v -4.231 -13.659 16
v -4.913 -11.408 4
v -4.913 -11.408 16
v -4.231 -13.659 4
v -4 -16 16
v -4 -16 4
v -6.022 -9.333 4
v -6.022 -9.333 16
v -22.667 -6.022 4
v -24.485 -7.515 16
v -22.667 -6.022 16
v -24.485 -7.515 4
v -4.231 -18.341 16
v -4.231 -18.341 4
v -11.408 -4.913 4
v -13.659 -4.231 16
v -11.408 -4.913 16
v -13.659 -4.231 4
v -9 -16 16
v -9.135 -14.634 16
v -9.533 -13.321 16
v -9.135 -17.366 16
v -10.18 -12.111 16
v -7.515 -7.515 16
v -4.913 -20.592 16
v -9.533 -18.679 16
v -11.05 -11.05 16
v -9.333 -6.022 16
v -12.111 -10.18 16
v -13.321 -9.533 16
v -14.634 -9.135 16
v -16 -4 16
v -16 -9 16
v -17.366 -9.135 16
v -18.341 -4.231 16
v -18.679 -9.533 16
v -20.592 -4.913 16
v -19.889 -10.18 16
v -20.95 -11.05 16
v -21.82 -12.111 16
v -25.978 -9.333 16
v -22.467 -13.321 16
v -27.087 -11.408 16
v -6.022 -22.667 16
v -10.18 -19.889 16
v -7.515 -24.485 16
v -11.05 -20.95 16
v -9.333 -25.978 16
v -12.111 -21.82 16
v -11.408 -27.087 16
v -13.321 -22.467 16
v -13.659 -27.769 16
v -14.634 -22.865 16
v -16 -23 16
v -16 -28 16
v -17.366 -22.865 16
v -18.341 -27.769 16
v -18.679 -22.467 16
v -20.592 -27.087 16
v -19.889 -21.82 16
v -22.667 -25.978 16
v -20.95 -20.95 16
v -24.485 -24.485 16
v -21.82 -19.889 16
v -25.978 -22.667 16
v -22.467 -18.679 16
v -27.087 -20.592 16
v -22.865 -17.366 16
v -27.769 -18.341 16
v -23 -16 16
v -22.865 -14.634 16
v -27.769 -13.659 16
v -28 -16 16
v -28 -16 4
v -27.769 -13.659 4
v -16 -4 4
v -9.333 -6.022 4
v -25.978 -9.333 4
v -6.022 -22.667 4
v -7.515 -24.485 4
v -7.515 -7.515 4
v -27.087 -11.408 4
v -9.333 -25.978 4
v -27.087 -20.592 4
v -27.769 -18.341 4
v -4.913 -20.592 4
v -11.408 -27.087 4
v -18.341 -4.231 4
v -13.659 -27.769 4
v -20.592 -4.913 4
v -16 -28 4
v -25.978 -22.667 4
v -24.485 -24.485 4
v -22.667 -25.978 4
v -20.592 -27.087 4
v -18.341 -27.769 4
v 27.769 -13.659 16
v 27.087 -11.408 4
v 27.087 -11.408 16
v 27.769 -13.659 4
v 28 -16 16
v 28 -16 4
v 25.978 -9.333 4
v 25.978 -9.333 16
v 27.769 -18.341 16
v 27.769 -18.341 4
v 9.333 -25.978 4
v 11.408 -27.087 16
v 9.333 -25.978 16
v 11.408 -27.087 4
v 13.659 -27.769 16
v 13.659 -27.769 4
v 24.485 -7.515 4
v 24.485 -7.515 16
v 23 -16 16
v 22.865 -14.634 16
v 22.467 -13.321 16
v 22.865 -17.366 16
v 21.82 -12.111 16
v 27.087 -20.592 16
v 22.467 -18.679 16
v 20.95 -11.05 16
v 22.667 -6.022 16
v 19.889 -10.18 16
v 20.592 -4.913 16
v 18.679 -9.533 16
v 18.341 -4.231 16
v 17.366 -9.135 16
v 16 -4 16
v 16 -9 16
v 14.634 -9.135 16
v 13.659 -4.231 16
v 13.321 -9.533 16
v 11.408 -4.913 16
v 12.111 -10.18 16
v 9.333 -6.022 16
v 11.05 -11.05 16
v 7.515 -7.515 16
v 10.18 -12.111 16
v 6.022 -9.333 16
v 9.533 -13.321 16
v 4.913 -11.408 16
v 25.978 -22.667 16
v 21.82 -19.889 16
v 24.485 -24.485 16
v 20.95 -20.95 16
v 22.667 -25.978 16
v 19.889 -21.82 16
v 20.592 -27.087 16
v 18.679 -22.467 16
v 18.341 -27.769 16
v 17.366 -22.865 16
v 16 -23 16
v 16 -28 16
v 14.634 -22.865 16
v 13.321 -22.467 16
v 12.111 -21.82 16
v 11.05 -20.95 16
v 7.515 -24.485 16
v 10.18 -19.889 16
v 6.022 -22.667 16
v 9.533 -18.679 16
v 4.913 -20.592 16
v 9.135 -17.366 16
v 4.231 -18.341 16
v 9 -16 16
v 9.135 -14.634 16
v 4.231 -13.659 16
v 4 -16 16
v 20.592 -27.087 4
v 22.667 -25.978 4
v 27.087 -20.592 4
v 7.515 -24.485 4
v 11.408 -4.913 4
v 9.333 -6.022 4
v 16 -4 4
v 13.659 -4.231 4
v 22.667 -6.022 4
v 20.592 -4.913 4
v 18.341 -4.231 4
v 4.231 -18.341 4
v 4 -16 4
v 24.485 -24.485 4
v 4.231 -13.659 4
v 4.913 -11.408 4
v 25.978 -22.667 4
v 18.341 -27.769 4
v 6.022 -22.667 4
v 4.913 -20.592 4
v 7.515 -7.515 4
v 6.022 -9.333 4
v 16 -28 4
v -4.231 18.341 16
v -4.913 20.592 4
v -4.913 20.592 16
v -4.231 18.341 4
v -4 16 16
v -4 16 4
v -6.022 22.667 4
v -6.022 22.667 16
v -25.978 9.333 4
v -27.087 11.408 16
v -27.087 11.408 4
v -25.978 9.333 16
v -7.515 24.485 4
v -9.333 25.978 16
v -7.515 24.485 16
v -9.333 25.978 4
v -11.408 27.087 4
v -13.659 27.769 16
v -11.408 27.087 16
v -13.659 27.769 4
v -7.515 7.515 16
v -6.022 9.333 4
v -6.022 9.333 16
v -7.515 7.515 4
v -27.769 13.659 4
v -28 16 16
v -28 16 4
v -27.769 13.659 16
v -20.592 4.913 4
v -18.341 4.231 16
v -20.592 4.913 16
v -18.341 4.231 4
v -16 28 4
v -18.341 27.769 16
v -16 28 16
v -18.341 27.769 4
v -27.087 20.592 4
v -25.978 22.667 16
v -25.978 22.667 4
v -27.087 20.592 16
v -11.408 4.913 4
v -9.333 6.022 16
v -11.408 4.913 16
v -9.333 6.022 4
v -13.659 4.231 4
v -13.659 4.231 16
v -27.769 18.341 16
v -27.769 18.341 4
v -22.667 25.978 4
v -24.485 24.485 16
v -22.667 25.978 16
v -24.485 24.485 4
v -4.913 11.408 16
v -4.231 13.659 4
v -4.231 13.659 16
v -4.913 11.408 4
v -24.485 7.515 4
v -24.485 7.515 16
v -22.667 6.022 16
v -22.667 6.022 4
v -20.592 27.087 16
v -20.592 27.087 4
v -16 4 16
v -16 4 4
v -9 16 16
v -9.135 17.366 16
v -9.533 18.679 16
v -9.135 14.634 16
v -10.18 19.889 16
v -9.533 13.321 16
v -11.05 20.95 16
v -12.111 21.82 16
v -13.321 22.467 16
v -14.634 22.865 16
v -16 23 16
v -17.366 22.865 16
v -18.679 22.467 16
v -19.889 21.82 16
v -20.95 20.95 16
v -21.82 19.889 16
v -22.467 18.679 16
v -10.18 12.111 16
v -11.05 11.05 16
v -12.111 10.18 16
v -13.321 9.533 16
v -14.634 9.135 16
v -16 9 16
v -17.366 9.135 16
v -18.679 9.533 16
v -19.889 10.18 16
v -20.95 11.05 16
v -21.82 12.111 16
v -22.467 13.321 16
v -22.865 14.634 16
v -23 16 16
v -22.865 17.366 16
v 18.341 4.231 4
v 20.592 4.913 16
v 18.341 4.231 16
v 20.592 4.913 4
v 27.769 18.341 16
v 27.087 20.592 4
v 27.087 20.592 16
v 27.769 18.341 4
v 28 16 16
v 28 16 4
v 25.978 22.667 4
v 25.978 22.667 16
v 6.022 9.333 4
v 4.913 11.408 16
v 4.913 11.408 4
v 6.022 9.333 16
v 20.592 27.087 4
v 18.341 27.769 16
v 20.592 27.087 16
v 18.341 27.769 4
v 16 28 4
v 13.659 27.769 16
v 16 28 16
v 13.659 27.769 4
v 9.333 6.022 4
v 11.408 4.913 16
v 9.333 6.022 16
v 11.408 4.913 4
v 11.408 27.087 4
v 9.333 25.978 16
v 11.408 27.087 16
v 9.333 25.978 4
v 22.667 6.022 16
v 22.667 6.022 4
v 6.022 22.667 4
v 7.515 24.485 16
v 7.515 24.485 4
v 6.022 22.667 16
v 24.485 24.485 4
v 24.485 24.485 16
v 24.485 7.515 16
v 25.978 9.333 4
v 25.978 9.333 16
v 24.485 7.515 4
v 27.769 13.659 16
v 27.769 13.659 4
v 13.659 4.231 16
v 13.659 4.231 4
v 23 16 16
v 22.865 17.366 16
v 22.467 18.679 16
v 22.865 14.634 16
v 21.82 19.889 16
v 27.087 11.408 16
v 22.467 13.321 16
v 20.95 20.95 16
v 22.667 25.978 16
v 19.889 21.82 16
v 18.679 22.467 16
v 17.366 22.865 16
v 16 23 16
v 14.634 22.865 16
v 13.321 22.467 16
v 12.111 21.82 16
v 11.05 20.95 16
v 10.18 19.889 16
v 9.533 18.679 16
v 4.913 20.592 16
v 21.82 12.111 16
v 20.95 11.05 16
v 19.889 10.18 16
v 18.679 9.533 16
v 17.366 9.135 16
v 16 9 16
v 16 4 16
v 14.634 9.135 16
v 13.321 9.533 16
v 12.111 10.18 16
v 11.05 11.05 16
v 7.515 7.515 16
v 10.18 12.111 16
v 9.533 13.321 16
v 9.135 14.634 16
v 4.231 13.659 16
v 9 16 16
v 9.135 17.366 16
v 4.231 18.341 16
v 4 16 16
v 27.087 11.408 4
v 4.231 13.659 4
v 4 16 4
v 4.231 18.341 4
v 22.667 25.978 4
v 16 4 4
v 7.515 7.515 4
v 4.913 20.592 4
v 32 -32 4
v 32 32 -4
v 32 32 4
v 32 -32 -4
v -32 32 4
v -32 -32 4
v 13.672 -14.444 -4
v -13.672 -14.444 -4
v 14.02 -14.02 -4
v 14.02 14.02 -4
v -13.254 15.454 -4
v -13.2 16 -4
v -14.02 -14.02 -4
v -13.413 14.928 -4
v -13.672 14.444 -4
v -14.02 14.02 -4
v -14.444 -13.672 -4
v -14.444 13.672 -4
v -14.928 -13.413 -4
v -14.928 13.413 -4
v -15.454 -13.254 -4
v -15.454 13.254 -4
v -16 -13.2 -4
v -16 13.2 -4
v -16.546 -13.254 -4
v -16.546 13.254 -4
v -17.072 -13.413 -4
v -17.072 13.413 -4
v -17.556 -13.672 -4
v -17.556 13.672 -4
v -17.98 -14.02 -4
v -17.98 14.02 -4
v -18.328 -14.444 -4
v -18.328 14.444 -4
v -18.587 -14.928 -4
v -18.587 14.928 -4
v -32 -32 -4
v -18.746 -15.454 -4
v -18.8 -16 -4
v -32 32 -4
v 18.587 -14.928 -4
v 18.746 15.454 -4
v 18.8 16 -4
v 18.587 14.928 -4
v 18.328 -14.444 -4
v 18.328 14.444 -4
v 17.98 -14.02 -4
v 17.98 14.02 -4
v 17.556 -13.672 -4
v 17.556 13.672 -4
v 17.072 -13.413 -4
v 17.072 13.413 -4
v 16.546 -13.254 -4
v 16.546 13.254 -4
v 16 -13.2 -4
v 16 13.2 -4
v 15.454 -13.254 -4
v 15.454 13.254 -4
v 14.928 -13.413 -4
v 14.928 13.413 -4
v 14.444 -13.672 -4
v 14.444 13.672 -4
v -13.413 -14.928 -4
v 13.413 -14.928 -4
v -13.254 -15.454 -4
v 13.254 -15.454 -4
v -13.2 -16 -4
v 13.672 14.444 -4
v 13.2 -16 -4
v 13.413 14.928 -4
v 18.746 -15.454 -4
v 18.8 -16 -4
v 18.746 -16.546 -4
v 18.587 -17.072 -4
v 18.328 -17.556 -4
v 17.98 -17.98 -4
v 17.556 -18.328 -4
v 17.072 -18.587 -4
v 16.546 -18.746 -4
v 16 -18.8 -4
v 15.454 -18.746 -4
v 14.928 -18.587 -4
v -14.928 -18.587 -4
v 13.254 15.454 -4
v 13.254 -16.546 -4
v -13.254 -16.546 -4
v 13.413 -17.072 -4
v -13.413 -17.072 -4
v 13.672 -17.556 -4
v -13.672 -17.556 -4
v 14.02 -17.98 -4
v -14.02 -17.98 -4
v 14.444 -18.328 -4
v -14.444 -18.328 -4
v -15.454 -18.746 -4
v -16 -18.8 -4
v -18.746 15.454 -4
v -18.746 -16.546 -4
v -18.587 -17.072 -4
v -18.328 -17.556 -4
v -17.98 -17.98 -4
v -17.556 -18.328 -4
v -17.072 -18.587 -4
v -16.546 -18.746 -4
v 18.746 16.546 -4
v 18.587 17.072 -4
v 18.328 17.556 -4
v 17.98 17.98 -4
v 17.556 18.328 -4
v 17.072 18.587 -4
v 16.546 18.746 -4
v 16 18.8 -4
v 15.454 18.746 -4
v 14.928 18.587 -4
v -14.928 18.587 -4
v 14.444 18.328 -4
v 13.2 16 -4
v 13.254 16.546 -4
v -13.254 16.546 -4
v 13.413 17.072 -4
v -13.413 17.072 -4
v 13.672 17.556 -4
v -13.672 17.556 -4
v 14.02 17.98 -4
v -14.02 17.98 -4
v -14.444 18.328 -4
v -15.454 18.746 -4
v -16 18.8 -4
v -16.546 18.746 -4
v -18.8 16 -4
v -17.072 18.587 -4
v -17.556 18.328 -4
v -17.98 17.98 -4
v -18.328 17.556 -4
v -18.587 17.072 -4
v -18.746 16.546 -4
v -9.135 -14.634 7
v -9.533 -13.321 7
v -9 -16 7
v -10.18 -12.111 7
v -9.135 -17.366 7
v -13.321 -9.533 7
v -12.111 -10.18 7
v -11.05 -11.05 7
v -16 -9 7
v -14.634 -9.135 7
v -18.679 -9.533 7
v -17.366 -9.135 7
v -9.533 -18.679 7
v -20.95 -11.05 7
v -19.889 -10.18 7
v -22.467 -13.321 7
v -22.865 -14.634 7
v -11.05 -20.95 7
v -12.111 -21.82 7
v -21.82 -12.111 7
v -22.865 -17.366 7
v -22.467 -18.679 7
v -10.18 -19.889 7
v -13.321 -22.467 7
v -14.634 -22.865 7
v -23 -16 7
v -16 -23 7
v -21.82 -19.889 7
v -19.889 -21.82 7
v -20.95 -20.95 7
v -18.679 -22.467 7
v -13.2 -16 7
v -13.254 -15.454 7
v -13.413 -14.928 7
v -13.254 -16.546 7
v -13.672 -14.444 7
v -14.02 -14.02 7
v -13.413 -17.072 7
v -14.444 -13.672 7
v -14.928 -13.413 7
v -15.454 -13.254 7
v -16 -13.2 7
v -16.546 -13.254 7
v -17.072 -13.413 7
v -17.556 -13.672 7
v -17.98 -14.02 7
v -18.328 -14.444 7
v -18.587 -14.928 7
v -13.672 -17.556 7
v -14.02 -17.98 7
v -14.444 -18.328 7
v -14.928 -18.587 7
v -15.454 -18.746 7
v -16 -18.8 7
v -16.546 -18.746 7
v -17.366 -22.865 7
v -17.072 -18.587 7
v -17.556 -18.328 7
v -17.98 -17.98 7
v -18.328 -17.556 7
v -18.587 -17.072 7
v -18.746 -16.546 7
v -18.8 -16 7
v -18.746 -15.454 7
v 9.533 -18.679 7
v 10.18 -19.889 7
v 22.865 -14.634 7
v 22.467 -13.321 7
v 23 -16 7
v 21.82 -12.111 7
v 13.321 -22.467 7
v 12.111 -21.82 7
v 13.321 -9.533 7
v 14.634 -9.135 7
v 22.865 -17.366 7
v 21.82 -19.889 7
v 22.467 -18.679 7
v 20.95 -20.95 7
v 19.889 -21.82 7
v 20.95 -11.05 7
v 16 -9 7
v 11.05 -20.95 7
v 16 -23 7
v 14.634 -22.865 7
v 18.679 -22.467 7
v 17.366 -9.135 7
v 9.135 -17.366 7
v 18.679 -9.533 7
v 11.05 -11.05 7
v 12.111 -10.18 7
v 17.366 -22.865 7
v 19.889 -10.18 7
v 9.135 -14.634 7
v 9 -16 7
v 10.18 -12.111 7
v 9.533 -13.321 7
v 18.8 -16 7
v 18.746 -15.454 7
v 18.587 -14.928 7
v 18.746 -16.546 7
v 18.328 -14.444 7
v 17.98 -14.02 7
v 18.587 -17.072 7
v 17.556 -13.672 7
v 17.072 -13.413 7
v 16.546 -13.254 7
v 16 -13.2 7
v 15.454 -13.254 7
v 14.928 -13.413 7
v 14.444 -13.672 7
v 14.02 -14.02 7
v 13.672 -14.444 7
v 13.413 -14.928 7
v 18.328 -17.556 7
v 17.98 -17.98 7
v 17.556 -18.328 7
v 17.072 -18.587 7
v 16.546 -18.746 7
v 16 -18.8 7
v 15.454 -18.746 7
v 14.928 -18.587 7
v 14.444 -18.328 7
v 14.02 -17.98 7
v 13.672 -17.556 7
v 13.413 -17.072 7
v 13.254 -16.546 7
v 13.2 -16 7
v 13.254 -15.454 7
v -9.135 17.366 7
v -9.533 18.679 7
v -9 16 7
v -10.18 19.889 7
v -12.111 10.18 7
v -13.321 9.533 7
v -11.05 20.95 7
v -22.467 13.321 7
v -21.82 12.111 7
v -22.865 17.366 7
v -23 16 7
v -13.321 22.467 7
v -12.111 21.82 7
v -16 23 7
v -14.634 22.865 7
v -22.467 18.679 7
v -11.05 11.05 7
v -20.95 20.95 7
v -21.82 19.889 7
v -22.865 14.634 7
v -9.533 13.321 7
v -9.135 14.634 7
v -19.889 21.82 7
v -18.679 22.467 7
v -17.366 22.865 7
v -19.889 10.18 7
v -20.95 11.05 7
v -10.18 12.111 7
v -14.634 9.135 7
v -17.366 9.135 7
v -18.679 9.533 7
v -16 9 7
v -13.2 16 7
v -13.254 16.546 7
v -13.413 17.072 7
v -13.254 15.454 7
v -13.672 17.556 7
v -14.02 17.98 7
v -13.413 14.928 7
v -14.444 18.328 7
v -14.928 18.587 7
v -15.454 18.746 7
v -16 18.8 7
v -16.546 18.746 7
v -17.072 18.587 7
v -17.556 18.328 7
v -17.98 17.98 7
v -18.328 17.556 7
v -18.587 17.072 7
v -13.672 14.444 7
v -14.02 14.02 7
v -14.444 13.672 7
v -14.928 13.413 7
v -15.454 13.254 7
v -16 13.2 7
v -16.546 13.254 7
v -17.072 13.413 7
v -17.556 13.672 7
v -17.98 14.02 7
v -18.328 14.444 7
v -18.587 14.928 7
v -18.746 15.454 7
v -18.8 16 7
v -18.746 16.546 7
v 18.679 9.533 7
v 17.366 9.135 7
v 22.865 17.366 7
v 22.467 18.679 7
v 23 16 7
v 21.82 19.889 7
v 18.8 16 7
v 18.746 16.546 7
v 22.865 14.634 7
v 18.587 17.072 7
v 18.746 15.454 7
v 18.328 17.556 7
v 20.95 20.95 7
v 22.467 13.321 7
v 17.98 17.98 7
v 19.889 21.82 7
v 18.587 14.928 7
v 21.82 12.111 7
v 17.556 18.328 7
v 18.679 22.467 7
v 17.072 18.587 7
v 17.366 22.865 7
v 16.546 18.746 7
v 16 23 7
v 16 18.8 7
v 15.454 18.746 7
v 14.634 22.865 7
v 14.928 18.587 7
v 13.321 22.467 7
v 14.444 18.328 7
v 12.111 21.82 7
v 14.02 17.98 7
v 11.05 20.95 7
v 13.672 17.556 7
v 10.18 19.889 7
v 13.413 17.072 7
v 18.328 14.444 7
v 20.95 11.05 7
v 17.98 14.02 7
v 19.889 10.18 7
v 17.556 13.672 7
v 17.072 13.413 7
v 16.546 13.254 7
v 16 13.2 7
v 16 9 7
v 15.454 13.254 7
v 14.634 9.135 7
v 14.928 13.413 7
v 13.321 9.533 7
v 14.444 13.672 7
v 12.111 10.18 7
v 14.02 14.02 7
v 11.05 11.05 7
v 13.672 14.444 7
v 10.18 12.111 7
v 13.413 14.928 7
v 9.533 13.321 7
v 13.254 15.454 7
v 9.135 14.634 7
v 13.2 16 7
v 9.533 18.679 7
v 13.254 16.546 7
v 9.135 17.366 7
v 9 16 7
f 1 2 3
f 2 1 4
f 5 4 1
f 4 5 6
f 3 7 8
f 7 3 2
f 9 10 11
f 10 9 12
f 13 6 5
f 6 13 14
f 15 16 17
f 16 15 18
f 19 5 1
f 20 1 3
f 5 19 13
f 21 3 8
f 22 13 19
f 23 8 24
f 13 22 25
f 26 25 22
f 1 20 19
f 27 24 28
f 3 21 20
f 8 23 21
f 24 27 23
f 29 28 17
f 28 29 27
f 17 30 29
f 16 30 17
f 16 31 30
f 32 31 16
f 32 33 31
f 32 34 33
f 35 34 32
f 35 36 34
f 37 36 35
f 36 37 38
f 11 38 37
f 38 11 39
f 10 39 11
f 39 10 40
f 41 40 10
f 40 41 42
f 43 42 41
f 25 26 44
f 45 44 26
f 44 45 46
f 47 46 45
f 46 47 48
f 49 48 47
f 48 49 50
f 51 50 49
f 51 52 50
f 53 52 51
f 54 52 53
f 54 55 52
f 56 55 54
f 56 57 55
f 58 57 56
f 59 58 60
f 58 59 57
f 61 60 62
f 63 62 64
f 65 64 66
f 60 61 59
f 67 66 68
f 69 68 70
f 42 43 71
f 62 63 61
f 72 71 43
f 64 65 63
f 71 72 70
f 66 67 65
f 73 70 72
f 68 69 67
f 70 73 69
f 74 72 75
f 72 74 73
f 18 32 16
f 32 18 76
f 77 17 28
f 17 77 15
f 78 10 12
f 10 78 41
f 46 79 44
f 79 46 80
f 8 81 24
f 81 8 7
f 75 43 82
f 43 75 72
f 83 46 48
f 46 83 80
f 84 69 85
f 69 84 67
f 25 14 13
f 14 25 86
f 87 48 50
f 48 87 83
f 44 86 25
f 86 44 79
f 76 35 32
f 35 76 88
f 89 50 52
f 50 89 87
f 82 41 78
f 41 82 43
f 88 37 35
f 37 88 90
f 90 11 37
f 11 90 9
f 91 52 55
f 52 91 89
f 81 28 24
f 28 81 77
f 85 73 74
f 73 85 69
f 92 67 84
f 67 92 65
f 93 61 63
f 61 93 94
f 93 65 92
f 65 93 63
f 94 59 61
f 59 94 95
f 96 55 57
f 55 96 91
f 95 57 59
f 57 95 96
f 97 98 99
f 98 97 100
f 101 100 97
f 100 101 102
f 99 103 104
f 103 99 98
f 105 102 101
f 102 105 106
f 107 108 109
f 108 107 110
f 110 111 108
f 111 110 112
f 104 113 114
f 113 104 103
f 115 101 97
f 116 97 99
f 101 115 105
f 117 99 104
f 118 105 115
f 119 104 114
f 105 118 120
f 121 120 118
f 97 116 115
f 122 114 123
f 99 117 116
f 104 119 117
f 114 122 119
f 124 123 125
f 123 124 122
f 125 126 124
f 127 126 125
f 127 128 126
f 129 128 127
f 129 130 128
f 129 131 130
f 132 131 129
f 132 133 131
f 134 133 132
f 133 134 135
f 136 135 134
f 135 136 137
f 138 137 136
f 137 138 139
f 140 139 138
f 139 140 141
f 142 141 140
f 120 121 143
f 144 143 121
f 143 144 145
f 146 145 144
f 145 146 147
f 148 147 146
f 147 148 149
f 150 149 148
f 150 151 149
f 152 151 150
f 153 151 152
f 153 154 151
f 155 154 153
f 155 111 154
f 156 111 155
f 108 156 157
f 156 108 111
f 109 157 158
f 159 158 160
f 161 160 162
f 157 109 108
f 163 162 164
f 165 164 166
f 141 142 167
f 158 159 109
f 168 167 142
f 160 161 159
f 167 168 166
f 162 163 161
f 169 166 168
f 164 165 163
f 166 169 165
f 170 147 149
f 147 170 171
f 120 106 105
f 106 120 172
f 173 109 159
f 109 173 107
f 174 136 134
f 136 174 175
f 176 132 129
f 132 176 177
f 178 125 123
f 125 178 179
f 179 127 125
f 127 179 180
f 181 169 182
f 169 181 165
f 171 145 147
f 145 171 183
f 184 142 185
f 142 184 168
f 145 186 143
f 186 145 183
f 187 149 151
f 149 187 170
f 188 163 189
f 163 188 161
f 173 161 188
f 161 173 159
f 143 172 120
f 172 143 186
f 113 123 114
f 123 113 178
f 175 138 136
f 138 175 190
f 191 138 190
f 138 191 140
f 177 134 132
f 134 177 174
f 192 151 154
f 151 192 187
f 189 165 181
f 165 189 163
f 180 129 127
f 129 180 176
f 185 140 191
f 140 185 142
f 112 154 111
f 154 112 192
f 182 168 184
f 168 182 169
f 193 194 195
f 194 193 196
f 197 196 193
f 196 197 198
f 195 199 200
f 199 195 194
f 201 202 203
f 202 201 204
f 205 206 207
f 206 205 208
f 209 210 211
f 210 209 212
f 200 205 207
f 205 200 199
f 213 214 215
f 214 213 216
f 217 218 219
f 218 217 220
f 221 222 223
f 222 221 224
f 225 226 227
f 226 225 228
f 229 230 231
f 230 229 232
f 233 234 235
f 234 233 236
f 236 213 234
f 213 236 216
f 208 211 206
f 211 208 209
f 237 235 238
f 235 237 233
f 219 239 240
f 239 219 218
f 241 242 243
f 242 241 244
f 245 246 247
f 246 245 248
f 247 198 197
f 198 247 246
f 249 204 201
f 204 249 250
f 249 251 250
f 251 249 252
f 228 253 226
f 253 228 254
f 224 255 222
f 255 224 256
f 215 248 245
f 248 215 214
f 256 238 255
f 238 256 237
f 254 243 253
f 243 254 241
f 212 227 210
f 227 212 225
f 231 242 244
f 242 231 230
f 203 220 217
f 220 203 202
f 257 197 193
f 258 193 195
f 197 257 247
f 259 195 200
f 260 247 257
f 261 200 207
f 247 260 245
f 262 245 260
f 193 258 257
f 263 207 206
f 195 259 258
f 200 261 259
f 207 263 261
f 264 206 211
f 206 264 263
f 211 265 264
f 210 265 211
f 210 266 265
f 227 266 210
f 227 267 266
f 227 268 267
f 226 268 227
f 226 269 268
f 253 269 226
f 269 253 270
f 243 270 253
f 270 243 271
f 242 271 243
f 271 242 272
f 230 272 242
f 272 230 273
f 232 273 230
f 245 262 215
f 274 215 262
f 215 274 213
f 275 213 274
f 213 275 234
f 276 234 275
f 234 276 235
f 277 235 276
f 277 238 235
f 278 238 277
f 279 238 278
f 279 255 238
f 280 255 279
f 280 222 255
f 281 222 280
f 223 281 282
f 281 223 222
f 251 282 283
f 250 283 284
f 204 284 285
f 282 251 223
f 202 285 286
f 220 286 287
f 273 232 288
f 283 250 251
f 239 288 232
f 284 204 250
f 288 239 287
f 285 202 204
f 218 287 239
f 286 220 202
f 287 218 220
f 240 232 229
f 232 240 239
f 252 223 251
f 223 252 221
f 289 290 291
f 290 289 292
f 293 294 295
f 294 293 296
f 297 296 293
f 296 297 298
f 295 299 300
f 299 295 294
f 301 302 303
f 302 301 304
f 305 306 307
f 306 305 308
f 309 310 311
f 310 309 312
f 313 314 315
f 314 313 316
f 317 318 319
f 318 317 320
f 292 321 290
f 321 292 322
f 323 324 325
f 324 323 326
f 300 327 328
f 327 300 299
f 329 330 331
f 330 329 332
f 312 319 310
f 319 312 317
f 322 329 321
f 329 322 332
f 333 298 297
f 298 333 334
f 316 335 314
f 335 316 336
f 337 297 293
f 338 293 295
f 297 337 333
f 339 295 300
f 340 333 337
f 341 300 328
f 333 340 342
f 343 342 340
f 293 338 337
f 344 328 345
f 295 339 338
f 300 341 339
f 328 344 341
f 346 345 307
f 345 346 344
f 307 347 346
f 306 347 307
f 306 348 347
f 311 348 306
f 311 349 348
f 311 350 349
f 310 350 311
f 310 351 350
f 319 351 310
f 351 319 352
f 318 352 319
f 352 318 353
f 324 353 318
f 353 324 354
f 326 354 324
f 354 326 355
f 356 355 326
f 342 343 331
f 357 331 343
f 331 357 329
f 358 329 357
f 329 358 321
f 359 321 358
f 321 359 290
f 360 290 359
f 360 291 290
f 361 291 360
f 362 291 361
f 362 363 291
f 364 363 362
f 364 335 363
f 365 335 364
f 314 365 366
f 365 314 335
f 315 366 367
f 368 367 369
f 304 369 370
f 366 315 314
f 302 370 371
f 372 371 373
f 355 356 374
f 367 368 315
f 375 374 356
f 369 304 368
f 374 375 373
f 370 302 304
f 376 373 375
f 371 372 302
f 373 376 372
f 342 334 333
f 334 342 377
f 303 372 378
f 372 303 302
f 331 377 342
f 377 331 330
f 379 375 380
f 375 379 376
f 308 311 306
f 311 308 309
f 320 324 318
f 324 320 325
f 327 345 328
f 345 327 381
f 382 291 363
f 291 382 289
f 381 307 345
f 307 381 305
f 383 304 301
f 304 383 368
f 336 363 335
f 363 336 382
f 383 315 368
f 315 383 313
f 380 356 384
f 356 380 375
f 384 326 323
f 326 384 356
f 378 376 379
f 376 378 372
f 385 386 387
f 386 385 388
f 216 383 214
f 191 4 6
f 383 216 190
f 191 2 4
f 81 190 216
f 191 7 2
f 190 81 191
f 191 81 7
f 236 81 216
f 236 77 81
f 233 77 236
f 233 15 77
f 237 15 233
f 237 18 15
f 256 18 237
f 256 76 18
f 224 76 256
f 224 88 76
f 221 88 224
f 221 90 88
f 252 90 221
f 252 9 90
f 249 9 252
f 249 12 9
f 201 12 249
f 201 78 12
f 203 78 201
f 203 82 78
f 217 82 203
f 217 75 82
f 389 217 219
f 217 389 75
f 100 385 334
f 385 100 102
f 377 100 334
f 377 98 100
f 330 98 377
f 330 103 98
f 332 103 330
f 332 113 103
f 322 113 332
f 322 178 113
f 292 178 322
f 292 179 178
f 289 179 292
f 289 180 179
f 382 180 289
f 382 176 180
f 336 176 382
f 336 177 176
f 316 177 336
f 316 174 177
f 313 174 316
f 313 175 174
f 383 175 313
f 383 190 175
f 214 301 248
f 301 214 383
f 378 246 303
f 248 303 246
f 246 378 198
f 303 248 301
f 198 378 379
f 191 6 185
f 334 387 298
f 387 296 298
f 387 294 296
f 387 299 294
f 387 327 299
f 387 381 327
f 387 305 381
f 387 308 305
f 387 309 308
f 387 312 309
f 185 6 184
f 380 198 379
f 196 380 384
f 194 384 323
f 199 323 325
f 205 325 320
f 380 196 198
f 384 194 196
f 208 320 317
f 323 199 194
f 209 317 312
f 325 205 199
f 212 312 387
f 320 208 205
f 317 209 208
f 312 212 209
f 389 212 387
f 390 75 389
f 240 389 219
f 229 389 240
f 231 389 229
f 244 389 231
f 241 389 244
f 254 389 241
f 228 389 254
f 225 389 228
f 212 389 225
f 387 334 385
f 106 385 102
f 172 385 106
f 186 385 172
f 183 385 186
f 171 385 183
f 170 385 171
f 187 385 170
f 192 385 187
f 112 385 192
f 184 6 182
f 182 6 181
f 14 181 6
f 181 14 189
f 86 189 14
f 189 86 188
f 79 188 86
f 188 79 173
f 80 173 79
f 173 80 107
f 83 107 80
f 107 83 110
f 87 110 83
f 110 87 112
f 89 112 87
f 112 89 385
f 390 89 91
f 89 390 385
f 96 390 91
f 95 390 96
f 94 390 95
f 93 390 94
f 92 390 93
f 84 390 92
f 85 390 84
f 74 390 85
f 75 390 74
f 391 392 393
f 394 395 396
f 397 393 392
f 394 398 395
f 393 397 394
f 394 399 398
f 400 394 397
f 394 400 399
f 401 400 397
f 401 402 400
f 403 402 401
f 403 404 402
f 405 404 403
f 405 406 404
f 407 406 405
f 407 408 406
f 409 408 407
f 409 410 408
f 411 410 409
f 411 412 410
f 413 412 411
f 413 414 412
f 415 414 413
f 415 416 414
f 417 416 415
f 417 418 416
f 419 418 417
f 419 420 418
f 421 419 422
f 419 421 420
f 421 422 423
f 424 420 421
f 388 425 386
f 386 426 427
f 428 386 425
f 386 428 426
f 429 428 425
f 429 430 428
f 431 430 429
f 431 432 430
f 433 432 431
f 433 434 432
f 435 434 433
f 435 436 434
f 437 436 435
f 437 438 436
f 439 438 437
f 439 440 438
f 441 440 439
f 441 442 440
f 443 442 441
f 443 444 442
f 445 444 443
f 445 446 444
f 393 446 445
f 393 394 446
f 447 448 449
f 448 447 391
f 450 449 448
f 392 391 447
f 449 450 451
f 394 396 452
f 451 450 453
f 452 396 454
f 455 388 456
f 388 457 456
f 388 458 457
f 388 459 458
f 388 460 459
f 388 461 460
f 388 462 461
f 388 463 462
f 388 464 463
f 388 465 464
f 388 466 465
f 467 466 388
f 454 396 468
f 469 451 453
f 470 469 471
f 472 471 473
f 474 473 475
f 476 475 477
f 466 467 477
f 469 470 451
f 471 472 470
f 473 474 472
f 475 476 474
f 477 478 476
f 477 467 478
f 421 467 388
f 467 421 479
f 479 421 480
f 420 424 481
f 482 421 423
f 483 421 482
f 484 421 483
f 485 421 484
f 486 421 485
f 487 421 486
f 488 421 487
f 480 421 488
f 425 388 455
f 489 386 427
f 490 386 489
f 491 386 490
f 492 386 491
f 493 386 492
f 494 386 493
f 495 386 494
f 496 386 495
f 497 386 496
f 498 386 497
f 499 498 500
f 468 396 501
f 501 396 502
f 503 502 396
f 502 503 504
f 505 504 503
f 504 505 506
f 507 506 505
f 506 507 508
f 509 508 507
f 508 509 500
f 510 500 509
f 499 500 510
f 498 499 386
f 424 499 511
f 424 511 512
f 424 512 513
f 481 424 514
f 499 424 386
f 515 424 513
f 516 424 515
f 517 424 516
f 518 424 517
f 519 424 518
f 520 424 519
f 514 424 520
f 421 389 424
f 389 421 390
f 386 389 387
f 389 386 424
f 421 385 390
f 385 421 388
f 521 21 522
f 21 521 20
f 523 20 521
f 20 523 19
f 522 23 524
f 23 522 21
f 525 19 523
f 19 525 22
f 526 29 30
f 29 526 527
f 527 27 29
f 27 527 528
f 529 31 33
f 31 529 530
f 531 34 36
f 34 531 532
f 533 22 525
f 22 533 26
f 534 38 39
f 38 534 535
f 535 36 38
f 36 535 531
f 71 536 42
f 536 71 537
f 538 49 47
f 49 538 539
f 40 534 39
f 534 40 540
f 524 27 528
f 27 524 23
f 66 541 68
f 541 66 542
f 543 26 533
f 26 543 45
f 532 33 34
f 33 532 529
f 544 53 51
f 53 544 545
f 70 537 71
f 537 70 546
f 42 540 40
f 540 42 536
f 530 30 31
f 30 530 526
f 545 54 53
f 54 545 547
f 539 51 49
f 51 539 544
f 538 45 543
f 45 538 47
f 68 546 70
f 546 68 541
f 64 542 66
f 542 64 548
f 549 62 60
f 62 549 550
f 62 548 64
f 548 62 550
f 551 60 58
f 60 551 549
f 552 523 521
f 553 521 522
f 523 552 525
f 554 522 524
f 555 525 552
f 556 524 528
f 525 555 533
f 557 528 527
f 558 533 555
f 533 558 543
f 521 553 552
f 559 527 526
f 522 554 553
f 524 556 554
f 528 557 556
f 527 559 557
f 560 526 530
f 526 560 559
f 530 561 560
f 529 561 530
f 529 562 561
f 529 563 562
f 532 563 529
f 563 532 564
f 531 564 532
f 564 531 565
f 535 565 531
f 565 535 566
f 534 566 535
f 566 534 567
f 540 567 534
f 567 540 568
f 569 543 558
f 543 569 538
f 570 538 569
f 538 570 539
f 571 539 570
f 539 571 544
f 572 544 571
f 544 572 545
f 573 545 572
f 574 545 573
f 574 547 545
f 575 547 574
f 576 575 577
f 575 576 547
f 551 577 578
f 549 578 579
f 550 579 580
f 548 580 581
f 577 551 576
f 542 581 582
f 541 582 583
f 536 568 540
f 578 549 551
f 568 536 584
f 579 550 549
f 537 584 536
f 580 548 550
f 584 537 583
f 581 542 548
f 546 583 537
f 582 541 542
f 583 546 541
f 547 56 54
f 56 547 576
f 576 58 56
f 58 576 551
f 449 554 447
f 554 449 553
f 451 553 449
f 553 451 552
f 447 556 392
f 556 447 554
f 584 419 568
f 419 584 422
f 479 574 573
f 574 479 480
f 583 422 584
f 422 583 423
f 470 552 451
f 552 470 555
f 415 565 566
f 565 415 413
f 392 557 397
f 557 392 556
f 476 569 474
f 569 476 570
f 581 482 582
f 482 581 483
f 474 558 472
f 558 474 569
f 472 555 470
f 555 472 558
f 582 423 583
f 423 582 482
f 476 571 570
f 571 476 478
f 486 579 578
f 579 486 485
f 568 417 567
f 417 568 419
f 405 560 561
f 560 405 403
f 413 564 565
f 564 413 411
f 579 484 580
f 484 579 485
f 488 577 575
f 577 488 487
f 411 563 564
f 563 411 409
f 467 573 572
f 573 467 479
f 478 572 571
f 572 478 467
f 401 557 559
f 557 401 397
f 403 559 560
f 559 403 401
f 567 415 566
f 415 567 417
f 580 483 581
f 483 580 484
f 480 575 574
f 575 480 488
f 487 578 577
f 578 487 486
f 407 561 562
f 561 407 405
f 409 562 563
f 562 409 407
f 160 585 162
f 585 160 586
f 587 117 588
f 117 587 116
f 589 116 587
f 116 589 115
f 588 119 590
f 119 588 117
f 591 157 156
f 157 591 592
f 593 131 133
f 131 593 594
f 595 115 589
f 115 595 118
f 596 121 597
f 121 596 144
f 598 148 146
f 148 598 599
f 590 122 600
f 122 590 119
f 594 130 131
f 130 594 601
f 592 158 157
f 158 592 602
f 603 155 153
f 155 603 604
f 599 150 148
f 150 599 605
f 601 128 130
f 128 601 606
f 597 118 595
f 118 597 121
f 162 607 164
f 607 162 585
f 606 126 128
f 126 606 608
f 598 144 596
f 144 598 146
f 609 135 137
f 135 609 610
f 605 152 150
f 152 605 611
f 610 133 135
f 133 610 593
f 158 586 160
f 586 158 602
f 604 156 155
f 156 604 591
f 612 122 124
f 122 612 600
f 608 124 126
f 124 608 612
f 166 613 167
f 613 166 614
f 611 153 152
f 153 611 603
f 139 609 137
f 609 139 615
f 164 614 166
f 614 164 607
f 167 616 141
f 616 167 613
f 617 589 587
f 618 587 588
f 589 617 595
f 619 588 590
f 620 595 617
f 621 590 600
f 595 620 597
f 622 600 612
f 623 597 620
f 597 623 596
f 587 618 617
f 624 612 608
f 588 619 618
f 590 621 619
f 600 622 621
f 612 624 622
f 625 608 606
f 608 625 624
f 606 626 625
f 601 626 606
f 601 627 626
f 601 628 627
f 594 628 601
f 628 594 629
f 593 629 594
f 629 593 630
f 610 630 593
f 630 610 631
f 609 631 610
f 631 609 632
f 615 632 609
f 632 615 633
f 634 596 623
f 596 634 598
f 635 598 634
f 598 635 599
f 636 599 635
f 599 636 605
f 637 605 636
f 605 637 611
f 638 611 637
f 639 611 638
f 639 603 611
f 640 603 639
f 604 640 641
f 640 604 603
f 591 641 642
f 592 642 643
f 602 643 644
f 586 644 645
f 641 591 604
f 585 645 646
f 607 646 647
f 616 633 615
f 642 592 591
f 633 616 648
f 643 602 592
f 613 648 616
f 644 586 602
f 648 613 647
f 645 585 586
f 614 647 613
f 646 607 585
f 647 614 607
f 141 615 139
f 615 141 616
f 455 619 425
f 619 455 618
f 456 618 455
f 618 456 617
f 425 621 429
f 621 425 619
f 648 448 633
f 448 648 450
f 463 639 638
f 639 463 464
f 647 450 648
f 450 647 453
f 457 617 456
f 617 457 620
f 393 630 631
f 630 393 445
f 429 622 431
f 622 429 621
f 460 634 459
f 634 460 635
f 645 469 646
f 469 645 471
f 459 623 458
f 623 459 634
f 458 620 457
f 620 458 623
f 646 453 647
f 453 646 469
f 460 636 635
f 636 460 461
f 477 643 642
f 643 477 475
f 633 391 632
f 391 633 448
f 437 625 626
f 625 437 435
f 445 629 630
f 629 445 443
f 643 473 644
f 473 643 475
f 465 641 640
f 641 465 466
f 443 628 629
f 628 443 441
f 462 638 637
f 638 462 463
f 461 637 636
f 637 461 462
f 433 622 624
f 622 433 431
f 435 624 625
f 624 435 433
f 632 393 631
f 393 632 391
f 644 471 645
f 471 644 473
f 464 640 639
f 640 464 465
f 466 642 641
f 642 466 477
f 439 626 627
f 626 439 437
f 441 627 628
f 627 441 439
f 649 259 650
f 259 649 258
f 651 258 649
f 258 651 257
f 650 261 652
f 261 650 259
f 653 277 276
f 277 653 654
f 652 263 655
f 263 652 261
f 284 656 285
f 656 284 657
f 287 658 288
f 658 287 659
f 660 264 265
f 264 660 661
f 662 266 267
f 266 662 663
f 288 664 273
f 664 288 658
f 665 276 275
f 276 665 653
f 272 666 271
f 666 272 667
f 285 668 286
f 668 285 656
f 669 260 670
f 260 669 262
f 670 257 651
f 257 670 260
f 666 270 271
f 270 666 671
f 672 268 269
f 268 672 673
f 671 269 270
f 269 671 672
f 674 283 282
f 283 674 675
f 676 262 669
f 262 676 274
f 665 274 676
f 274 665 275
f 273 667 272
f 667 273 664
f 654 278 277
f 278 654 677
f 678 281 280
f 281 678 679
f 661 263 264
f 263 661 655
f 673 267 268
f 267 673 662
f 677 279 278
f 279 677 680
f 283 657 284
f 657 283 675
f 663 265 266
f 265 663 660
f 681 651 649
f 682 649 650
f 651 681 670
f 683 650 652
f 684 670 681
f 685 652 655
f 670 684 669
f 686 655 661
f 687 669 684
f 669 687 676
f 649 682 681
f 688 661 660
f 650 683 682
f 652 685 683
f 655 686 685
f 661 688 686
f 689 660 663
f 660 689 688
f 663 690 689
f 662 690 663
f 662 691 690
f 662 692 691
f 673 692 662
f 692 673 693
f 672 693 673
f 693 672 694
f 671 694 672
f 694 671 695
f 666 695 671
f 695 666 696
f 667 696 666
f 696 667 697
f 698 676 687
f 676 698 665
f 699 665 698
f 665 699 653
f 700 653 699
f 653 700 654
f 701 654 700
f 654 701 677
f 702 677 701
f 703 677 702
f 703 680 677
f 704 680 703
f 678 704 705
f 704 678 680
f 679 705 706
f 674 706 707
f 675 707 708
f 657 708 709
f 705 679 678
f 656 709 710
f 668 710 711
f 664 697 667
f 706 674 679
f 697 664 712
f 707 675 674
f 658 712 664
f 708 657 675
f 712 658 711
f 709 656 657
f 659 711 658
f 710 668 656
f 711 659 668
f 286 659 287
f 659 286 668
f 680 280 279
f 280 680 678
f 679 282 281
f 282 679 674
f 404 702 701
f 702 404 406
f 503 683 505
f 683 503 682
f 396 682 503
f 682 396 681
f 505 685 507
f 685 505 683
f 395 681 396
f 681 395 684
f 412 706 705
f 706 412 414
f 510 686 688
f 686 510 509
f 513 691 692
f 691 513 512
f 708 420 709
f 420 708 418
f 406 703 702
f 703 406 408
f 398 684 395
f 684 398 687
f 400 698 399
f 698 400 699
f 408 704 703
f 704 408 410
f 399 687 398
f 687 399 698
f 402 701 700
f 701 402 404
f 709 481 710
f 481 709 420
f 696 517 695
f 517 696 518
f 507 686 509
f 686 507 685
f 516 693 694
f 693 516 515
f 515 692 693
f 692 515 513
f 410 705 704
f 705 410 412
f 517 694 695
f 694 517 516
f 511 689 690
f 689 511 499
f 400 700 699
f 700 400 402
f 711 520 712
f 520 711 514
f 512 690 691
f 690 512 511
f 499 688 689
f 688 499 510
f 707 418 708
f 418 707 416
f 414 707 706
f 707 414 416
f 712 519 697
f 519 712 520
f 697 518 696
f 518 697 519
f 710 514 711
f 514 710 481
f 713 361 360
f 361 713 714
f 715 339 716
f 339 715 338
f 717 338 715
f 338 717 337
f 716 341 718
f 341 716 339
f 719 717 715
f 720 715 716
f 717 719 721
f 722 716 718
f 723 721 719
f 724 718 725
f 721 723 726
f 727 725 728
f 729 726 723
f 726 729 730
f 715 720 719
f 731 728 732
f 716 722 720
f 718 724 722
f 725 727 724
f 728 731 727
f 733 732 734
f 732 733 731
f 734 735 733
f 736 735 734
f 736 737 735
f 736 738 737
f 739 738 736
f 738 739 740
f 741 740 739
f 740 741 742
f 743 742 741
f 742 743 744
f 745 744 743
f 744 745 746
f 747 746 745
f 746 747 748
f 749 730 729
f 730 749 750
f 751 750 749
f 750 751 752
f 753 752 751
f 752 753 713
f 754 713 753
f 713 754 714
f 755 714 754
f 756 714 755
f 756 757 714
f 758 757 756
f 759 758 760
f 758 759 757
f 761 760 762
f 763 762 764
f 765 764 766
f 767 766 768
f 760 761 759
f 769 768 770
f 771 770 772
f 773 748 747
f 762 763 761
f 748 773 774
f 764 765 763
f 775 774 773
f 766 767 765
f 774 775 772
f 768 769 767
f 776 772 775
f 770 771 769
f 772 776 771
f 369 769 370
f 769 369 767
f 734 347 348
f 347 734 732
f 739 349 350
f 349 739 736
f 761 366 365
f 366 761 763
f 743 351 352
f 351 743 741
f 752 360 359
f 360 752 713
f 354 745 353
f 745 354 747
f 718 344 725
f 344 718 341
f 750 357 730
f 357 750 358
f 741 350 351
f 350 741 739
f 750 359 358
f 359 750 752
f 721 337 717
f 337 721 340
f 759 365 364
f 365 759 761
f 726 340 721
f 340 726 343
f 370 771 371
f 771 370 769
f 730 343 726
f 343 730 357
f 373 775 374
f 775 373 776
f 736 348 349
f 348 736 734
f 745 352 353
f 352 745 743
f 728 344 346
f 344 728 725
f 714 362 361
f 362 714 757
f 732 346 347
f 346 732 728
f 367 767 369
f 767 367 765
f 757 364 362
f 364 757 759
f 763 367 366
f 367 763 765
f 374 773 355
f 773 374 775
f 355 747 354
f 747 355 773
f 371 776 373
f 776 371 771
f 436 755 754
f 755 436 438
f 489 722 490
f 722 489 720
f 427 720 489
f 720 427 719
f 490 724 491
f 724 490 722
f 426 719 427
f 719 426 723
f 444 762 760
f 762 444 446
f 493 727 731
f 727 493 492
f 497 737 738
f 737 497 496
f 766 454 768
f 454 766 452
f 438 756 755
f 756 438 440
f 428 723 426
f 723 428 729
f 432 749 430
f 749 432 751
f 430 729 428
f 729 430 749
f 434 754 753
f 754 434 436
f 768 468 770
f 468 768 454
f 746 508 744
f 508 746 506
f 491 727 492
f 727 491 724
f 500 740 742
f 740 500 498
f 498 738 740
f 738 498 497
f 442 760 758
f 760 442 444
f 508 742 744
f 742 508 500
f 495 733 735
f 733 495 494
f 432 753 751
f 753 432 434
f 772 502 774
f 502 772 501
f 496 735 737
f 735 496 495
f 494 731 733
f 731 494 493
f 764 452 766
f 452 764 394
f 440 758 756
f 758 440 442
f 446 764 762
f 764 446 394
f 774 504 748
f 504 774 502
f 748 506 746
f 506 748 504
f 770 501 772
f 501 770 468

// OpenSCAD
$fn = 32;

// ----------------------------------------------------------------------
// Socket pad plate
// bosses with counterbored sockets for the screws
// ----------------------------------------------------------------------

// --- parameters (mm) ---
base_t = 8;        // base plate thickness
boss_h = 12;       // boss height above the base plate
boss_d = 24;       // boss diameter
socket_d = 14;     // socket diameter
socket_depth = 9;  // socket depth from the boss face
bolt_d = 5.6;      // screw clearance hole through the socket floor
rows = 2;          // boss rows
cols = 2;          // bosses per row
pitch = 32;        // boss pitch

// --- derived feature positions (mm) ---
height = base_t + boss_h;           // = 20   overall height of the part
plate = [pitch * (cols - 1) + boss_d + 8, pitch * (rows - 1) + boss_d + 8, base_t];  // = [64, 64, 8]   overall size (x, y, z)
span_x = pitch * (cols - 1);        // = 32   distance between outer bosses
span_y = pitch * (rows - 1);        // = 32   distance between boss rows
origin_x = -span_x / 2;             // = -16   X of the first boss
origin_y = -span_y / 2;             // = -16   Y of the first boss
feature_centers = [
  [origin_x + 0 * pitch, origin_y + 0 * pitch],
  [origin_x + 1 * pitch, origin_y + 0 * pitch],
  [origin_x + 0 * pitch, origin_y + 1 * pitch],
  [origin_x + 1 * pitch, origin_y + 1 * pitch]
];   // boss centres: sockets, holes and the pads themselves are placed from here

// base plate, bosses on feature_centers, socket + through hole in each
difference() {
  union() {
    cube(plate, center = true);
    for (centre = feature_centers)
      translate([centre[0], centre[1], plate[2] / 2 - 1])
        cylinder(d = boss_d, h = boss_h + 1);
  }
  for (centre = feature_centers) {
    translate([centre[0], centre[1], plate[2] / 2 + boss_h - socket_depth])
      cylinder(d = socket_d, h = socket_depth + 1);
    translate([centre[0], centre[1], -height])
      cylinder(d = bolt_d, h = 2 * height + 2);  // through the socket floor
  }
}
